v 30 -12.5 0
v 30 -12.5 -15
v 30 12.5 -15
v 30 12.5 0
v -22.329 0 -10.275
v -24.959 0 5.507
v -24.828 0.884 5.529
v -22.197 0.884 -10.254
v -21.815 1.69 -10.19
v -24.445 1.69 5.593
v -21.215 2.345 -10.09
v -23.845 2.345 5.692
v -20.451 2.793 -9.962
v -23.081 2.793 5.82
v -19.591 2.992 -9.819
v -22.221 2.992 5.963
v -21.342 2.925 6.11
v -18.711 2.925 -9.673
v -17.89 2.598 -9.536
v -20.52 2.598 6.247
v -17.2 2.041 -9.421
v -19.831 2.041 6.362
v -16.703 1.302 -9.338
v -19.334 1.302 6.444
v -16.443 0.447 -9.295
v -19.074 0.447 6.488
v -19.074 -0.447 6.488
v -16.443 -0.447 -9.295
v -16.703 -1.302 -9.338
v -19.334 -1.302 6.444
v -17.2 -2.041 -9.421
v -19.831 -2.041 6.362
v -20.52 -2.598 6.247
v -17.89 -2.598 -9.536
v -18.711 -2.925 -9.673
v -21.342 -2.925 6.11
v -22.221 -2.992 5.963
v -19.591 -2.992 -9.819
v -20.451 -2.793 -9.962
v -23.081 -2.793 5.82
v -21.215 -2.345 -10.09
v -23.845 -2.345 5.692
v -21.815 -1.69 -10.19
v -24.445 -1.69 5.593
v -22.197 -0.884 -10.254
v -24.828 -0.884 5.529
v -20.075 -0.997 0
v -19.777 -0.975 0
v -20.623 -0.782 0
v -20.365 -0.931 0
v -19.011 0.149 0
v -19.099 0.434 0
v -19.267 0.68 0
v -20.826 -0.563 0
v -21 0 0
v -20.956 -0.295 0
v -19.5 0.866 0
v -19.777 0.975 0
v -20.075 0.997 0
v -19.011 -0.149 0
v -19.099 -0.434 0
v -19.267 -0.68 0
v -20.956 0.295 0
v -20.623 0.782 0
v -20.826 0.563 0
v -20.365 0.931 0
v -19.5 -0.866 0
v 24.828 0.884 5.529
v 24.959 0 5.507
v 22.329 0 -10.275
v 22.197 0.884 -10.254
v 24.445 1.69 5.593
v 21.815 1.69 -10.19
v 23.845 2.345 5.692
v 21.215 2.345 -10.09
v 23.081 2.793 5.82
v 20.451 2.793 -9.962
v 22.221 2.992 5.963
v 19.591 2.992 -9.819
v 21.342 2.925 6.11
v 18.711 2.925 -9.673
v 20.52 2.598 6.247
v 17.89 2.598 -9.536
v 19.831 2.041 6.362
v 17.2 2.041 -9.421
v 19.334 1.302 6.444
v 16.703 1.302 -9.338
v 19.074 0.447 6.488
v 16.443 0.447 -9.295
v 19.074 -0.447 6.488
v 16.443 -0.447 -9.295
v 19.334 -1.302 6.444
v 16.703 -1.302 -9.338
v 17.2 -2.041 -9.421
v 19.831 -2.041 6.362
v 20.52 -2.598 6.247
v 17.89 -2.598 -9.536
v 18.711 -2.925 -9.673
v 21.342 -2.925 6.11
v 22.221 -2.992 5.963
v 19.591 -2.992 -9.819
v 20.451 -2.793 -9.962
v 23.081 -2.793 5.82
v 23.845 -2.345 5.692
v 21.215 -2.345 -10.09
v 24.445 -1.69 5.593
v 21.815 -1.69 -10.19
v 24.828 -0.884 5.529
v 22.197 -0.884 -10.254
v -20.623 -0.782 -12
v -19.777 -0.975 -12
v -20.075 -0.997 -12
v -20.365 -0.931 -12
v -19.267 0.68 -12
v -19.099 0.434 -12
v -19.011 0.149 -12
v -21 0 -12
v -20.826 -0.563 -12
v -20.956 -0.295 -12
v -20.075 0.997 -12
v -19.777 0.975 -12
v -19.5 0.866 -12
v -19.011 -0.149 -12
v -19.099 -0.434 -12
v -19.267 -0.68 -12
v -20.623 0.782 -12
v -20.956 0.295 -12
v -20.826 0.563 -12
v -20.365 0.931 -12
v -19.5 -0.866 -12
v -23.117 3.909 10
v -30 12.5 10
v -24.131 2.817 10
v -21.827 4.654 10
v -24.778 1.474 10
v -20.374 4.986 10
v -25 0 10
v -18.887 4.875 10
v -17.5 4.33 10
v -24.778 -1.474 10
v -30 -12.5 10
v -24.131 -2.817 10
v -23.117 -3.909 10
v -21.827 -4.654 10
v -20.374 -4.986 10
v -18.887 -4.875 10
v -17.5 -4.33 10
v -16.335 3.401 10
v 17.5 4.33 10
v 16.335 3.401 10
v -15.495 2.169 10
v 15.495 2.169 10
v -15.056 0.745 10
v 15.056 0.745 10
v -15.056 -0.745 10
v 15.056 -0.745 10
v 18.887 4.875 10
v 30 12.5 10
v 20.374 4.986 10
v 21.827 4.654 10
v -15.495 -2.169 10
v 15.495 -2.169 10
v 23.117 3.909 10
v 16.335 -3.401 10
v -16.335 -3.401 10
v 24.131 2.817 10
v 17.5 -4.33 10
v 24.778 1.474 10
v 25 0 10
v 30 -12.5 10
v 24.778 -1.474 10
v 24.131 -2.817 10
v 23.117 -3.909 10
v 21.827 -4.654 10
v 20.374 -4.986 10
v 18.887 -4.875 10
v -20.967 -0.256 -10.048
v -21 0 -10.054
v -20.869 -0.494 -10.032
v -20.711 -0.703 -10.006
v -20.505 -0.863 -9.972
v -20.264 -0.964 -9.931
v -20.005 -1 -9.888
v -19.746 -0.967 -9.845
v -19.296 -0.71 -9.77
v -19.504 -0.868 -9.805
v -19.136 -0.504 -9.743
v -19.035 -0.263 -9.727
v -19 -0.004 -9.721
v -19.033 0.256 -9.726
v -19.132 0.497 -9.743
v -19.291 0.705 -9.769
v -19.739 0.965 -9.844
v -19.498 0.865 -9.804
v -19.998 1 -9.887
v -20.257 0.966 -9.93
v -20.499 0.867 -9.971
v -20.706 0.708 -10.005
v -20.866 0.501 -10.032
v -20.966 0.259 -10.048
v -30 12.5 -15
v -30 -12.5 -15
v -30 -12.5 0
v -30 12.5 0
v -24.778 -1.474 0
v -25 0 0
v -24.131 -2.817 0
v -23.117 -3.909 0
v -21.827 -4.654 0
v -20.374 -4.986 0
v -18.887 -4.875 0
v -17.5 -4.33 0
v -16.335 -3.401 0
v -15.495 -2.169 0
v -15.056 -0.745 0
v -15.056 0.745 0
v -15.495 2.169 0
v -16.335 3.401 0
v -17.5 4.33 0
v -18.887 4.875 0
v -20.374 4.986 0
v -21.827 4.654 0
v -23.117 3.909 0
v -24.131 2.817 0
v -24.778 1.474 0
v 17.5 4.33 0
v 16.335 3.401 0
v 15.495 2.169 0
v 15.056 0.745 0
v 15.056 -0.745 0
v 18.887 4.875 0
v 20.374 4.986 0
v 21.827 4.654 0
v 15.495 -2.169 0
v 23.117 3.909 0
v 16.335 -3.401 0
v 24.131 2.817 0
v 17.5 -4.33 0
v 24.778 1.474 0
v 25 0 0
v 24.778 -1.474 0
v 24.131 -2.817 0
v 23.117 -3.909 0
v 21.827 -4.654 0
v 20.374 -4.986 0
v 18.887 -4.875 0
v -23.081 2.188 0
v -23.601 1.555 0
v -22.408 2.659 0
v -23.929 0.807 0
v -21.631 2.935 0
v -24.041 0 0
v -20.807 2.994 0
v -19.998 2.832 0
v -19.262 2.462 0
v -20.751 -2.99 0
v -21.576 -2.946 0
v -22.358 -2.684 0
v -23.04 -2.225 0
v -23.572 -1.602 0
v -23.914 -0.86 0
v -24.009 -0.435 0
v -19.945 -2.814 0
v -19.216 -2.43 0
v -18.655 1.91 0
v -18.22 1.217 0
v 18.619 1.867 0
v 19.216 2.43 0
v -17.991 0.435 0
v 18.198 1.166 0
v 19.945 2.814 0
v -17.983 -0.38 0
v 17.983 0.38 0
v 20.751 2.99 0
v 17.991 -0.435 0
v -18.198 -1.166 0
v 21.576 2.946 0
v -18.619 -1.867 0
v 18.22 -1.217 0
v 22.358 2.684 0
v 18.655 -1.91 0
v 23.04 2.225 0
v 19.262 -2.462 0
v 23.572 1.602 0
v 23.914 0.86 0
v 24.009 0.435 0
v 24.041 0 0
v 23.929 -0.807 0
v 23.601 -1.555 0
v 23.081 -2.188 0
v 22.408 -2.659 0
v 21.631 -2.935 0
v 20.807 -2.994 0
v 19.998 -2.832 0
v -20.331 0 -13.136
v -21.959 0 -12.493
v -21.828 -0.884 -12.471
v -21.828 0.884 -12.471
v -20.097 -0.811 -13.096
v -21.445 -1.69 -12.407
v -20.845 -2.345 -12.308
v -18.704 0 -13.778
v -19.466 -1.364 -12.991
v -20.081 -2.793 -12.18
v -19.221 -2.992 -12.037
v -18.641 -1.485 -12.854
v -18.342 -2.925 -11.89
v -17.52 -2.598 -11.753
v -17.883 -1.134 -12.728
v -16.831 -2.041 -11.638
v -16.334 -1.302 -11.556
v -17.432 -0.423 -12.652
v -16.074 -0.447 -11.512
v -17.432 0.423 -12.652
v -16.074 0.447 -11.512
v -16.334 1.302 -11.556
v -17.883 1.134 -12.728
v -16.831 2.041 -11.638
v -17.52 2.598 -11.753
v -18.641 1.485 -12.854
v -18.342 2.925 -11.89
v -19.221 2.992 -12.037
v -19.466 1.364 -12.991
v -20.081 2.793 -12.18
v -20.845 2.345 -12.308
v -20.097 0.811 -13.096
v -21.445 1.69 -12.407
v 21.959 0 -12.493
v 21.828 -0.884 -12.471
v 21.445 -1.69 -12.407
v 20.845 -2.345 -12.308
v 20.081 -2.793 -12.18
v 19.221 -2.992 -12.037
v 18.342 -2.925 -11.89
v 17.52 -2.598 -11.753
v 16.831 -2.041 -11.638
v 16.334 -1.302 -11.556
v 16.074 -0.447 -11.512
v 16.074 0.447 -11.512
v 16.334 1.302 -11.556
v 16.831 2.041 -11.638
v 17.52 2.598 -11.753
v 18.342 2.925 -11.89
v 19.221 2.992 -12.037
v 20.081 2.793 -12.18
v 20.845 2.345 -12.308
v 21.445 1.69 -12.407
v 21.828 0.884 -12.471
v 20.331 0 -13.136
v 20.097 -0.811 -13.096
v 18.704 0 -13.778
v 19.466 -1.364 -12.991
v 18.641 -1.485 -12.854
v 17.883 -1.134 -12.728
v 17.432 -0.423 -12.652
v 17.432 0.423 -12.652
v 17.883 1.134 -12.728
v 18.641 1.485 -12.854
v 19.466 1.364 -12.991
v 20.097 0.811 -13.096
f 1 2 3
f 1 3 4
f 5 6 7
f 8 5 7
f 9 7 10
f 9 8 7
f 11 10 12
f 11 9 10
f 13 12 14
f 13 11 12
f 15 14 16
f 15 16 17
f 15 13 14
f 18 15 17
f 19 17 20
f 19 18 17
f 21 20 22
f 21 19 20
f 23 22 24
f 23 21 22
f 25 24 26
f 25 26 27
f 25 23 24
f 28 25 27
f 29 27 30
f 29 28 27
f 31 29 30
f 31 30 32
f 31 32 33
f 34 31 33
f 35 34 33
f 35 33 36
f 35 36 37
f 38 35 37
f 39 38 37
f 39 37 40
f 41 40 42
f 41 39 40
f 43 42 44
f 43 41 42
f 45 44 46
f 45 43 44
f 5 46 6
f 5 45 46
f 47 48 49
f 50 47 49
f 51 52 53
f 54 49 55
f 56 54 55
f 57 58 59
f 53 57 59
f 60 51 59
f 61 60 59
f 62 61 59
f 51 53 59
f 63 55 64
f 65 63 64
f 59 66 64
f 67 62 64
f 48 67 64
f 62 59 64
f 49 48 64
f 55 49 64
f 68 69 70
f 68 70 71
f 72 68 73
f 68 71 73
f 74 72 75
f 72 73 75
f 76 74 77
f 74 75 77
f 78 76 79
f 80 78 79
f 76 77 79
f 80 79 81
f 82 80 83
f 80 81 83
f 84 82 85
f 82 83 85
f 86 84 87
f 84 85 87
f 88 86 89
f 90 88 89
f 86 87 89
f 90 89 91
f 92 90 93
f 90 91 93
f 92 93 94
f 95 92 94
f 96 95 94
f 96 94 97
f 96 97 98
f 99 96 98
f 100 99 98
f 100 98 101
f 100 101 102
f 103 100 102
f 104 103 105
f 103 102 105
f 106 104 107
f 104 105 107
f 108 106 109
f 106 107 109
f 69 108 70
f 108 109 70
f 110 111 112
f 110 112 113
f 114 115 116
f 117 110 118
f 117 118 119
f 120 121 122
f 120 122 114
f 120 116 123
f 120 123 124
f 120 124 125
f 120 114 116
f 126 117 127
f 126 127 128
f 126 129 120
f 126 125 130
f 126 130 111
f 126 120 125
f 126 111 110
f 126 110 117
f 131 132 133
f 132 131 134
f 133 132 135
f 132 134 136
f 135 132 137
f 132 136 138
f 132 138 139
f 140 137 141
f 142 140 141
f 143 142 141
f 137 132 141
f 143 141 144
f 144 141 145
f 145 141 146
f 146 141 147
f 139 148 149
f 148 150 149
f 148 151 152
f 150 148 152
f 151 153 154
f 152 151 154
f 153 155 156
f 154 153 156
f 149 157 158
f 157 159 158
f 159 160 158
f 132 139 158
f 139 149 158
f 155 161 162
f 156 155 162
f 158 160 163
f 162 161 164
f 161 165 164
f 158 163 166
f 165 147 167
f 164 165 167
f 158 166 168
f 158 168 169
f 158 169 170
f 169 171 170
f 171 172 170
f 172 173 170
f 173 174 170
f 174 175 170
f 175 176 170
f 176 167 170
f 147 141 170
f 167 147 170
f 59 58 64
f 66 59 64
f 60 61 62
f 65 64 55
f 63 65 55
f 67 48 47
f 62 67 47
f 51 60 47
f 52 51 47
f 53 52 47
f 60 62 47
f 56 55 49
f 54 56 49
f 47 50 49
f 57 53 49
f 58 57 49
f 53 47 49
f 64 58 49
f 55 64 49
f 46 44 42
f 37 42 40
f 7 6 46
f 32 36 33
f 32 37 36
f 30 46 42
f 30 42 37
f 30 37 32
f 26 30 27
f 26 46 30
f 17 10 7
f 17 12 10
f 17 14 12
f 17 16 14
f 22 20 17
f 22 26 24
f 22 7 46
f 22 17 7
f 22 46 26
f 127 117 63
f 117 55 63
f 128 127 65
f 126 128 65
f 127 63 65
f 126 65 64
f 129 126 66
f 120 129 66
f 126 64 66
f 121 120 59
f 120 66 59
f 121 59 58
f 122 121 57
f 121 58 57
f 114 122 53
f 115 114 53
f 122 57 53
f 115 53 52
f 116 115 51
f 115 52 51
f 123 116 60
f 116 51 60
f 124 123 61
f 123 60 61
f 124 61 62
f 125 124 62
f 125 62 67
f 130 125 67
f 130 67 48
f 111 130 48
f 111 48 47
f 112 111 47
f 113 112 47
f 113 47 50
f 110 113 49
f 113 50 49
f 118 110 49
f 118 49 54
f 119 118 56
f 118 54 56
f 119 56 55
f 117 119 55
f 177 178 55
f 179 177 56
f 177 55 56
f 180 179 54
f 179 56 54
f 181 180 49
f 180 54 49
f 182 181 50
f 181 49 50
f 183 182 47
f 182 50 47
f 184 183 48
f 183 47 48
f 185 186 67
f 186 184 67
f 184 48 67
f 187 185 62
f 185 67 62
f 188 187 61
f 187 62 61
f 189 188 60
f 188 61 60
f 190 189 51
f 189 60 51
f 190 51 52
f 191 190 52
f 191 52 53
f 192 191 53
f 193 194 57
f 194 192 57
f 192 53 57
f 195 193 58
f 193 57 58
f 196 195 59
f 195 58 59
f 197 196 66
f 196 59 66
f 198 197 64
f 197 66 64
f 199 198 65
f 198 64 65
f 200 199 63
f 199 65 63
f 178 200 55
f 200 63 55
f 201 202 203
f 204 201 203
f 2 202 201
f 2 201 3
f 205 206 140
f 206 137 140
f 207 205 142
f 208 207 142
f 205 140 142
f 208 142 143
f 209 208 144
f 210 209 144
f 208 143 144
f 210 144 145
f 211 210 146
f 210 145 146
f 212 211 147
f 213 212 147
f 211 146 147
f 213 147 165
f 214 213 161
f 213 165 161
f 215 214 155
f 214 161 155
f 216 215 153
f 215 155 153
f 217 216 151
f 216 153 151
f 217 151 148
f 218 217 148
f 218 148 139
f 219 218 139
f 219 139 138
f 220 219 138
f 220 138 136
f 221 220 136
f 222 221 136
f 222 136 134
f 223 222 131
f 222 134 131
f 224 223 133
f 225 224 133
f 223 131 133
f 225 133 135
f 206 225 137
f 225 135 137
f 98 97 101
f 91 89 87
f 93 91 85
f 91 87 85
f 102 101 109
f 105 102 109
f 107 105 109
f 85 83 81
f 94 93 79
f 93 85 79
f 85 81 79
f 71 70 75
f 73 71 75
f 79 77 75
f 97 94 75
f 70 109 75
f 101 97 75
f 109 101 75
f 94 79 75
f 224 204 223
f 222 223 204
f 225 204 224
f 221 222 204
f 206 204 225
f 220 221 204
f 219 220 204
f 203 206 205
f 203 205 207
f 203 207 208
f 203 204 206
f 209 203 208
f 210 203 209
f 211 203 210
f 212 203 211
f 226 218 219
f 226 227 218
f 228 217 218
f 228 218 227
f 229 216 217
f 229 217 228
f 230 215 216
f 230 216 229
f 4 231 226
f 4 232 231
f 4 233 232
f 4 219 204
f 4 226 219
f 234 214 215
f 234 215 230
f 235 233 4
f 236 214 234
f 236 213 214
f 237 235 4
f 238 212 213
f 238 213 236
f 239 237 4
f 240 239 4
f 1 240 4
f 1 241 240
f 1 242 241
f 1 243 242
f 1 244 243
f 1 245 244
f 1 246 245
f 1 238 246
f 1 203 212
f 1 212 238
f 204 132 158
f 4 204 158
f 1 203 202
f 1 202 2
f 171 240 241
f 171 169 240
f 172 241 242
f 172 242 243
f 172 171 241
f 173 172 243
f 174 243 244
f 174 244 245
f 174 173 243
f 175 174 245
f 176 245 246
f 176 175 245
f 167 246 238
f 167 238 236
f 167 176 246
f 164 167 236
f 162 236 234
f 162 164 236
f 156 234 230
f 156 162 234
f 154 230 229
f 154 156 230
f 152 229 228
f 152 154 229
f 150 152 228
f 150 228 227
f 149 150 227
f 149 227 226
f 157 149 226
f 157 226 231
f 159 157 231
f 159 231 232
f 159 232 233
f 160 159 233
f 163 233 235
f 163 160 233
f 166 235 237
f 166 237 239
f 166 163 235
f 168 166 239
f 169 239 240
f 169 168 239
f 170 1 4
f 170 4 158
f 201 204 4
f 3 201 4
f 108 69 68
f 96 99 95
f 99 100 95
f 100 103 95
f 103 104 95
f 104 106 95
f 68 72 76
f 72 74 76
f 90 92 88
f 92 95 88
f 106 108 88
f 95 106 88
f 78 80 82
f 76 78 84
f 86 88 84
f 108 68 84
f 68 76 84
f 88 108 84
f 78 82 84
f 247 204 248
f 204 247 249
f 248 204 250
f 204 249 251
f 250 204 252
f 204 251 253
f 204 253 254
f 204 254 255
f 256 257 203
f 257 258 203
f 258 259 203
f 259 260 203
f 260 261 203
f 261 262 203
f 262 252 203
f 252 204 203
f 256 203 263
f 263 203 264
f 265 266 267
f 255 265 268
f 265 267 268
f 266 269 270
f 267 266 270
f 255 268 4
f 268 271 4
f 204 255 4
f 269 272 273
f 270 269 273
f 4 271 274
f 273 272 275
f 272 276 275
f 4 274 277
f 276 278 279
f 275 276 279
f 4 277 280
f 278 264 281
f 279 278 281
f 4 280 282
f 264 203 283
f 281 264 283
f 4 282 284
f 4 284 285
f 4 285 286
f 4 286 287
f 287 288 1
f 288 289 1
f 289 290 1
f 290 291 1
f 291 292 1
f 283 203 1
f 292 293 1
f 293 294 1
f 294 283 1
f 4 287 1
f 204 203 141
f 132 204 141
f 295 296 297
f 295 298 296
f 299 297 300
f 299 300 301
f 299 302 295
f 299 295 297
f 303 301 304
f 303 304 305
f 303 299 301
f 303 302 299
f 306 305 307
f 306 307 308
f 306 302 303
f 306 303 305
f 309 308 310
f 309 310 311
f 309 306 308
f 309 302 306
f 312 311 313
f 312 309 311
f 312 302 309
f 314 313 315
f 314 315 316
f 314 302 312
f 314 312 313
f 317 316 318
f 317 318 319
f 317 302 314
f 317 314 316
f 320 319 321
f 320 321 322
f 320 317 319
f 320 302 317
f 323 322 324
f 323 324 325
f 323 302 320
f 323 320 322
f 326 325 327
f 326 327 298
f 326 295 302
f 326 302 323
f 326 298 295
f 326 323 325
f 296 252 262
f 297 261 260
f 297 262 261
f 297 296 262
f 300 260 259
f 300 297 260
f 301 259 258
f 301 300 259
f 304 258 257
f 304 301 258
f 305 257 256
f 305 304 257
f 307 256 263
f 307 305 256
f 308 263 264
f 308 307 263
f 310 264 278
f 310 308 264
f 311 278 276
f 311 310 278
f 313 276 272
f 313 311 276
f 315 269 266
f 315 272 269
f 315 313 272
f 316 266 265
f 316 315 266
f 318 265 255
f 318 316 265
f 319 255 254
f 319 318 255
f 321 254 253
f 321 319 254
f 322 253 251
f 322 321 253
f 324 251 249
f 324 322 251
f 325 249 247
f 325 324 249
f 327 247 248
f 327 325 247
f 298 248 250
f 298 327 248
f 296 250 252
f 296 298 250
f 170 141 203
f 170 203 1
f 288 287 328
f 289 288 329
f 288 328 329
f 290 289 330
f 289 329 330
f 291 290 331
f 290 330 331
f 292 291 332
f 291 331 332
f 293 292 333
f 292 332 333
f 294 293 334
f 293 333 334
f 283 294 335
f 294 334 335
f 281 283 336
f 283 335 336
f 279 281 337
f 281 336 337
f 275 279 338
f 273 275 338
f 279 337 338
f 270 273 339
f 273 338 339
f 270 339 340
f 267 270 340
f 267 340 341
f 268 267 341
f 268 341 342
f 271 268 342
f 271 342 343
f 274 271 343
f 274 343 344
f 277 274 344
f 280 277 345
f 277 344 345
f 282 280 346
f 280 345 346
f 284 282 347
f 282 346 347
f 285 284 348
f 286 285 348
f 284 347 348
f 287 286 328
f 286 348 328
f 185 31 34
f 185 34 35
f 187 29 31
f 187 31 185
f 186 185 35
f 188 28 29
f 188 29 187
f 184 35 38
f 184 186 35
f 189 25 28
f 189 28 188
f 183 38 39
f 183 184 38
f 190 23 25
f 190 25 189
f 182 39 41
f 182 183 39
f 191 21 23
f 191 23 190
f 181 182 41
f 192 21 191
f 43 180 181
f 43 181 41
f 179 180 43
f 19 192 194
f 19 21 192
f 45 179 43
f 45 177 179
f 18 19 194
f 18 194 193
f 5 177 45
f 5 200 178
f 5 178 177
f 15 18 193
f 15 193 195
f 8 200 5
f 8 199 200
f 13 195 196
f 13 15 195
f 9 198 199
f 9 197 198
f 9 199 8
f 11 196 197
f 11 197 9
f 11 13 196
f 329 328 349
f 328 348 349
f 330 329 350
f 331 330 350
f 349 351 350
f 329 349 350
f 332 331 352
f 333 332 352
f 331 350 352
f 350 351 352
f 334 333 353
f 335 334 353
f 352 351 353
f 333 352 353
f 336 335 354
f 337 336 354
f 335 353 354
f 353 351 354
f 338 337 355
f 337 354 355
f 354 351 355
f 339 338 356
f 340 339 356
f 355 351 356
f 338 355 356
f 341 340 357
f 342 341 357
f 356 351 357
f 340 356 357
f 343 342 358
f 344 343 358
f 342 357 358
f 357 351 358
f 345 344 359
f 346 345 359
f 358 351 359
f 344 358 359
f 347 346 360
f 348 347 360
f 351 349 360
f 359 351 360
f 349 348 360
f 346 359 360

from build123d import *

# Parameters (mm, degrees)
F0_W     = 60
F0_H     = 15
F1_DEPTH = 12.5
F4_W     = 1
F4_H     = 12
F6_W     = 60
F6_H     = 10
F7_DEPTH = 12.5
F8_W     = 5
F8_H     = 10
F12_W    = 1
F12_H    = 12


# Not quite as in the source:
# - a pattern or mirror of a feature is missing from the dataset's text; its kind, count and spacing are read off the source's solid


with BuildPart() as f1:
    # F0 (on Front) → F1 (new body, symmetric)
    with BuildSketch(Plane.XZ):
        with Locations((0, -7.5)):
            Rectangle(F0_W, F0_H)
    extrude(amount=F1_DEPTH, both=True)

    # F2 (on Front) → F3 (revolve, cut)
    with BuildSketch(Plane.XZ):
        Polygon((-21.9591817715, -12.4931969619), (-18.7036573682, -13.778055791), (-22, 6), (-24.9591817715, 5.5068030381), align=None)
    f3 = revolve(axis=Axis((-20.3518286841, 0, -3.8890278955), (-0.1643989873, 0, 0.9863939238)), mode=Mode.SUBTRACT)

    # F3_copies: F3 across plane
    add(f3.mirror(Plane(origin=(0, 0, 0), x_dir=(0, 0, 1), z_dir=(1, 0, 0))), mode=Mode.SUBTRACT)


with BuildPart() as f5:
    # F4 (on Front) → F5 (revolve)
    with BuildSketch(Plane.XZ):
        with Locations((-20.5, -6)):
            Rectangle(F4_W, F4_H)
    revolve(axis=Axis((-20, 0, -6), (0, 0, -1)))


with BuildPart() as f7:
    # F6 (on Front) → F7 (new body, symmetric)
    with BuildSketch(Plane.XZ):
        with Locations((0, 5)):
            Rectangle(F6_W, F6_H)
    extrude(amount=F7_DEPTH, both=True)

    # F8 (on Front) → F9 (revolve, cut)
    with BuildSketch(Plane.XZ):
        with Locations((-22.5, 5)):
            Rectangle(F8_W, F8_H)
    f9 = revolve(axis=Axis((-20, 0, 5), (0, 0, 1)), mode=Mode.SUBTRACT)

    # F9_copies: F9 across plane
    add(f9.mirror(Plane(origin=(0, 0, 0), x_dir=(0, 0, 1), z_dir=(1, 0, 0))), mode=Mode.SUBTRACT)


with BuildPart() as f11:
    # F10 (on Front) → F11 (revolve)
    with BuildSketch(Plane.XZ):
        Polygon((-24.9591817715, 5.5068030381), (-22.3287979746, -10.2754997432), (-19.3696162031, -9.7823027813), (-22, 6), align=None)
    revolve(axis=Axis((-20.6848081016, 0, -1.8911513907), (0.1643989873, 0, -0.9863939238)))


with BuildPart() as f11_copies_1:
    # F11_copies: instance of F11
    add(f11.part.mirror(Plane(origin=(0, 0, 0), x_dir=(0, 0, 1), z_dir=(1, 0, 0))))


with BuildPart() as f11_1:
    add(f11.part)

    # F12 (on Front) → F13 (revolve, cut)
    with BuildSketch(Plane.XZ):
        with Locations((-20.5, -6)):
            Rectangle(F12_W, F12_H)
    revolve(axis=Axis((-20, 0, -6), (0, 0, 1)), mode=Mode.SUBTRACT)


solid = Compound([f1.part, f5.part, f7.part, f11_copies_1.part, f11_1.part])
